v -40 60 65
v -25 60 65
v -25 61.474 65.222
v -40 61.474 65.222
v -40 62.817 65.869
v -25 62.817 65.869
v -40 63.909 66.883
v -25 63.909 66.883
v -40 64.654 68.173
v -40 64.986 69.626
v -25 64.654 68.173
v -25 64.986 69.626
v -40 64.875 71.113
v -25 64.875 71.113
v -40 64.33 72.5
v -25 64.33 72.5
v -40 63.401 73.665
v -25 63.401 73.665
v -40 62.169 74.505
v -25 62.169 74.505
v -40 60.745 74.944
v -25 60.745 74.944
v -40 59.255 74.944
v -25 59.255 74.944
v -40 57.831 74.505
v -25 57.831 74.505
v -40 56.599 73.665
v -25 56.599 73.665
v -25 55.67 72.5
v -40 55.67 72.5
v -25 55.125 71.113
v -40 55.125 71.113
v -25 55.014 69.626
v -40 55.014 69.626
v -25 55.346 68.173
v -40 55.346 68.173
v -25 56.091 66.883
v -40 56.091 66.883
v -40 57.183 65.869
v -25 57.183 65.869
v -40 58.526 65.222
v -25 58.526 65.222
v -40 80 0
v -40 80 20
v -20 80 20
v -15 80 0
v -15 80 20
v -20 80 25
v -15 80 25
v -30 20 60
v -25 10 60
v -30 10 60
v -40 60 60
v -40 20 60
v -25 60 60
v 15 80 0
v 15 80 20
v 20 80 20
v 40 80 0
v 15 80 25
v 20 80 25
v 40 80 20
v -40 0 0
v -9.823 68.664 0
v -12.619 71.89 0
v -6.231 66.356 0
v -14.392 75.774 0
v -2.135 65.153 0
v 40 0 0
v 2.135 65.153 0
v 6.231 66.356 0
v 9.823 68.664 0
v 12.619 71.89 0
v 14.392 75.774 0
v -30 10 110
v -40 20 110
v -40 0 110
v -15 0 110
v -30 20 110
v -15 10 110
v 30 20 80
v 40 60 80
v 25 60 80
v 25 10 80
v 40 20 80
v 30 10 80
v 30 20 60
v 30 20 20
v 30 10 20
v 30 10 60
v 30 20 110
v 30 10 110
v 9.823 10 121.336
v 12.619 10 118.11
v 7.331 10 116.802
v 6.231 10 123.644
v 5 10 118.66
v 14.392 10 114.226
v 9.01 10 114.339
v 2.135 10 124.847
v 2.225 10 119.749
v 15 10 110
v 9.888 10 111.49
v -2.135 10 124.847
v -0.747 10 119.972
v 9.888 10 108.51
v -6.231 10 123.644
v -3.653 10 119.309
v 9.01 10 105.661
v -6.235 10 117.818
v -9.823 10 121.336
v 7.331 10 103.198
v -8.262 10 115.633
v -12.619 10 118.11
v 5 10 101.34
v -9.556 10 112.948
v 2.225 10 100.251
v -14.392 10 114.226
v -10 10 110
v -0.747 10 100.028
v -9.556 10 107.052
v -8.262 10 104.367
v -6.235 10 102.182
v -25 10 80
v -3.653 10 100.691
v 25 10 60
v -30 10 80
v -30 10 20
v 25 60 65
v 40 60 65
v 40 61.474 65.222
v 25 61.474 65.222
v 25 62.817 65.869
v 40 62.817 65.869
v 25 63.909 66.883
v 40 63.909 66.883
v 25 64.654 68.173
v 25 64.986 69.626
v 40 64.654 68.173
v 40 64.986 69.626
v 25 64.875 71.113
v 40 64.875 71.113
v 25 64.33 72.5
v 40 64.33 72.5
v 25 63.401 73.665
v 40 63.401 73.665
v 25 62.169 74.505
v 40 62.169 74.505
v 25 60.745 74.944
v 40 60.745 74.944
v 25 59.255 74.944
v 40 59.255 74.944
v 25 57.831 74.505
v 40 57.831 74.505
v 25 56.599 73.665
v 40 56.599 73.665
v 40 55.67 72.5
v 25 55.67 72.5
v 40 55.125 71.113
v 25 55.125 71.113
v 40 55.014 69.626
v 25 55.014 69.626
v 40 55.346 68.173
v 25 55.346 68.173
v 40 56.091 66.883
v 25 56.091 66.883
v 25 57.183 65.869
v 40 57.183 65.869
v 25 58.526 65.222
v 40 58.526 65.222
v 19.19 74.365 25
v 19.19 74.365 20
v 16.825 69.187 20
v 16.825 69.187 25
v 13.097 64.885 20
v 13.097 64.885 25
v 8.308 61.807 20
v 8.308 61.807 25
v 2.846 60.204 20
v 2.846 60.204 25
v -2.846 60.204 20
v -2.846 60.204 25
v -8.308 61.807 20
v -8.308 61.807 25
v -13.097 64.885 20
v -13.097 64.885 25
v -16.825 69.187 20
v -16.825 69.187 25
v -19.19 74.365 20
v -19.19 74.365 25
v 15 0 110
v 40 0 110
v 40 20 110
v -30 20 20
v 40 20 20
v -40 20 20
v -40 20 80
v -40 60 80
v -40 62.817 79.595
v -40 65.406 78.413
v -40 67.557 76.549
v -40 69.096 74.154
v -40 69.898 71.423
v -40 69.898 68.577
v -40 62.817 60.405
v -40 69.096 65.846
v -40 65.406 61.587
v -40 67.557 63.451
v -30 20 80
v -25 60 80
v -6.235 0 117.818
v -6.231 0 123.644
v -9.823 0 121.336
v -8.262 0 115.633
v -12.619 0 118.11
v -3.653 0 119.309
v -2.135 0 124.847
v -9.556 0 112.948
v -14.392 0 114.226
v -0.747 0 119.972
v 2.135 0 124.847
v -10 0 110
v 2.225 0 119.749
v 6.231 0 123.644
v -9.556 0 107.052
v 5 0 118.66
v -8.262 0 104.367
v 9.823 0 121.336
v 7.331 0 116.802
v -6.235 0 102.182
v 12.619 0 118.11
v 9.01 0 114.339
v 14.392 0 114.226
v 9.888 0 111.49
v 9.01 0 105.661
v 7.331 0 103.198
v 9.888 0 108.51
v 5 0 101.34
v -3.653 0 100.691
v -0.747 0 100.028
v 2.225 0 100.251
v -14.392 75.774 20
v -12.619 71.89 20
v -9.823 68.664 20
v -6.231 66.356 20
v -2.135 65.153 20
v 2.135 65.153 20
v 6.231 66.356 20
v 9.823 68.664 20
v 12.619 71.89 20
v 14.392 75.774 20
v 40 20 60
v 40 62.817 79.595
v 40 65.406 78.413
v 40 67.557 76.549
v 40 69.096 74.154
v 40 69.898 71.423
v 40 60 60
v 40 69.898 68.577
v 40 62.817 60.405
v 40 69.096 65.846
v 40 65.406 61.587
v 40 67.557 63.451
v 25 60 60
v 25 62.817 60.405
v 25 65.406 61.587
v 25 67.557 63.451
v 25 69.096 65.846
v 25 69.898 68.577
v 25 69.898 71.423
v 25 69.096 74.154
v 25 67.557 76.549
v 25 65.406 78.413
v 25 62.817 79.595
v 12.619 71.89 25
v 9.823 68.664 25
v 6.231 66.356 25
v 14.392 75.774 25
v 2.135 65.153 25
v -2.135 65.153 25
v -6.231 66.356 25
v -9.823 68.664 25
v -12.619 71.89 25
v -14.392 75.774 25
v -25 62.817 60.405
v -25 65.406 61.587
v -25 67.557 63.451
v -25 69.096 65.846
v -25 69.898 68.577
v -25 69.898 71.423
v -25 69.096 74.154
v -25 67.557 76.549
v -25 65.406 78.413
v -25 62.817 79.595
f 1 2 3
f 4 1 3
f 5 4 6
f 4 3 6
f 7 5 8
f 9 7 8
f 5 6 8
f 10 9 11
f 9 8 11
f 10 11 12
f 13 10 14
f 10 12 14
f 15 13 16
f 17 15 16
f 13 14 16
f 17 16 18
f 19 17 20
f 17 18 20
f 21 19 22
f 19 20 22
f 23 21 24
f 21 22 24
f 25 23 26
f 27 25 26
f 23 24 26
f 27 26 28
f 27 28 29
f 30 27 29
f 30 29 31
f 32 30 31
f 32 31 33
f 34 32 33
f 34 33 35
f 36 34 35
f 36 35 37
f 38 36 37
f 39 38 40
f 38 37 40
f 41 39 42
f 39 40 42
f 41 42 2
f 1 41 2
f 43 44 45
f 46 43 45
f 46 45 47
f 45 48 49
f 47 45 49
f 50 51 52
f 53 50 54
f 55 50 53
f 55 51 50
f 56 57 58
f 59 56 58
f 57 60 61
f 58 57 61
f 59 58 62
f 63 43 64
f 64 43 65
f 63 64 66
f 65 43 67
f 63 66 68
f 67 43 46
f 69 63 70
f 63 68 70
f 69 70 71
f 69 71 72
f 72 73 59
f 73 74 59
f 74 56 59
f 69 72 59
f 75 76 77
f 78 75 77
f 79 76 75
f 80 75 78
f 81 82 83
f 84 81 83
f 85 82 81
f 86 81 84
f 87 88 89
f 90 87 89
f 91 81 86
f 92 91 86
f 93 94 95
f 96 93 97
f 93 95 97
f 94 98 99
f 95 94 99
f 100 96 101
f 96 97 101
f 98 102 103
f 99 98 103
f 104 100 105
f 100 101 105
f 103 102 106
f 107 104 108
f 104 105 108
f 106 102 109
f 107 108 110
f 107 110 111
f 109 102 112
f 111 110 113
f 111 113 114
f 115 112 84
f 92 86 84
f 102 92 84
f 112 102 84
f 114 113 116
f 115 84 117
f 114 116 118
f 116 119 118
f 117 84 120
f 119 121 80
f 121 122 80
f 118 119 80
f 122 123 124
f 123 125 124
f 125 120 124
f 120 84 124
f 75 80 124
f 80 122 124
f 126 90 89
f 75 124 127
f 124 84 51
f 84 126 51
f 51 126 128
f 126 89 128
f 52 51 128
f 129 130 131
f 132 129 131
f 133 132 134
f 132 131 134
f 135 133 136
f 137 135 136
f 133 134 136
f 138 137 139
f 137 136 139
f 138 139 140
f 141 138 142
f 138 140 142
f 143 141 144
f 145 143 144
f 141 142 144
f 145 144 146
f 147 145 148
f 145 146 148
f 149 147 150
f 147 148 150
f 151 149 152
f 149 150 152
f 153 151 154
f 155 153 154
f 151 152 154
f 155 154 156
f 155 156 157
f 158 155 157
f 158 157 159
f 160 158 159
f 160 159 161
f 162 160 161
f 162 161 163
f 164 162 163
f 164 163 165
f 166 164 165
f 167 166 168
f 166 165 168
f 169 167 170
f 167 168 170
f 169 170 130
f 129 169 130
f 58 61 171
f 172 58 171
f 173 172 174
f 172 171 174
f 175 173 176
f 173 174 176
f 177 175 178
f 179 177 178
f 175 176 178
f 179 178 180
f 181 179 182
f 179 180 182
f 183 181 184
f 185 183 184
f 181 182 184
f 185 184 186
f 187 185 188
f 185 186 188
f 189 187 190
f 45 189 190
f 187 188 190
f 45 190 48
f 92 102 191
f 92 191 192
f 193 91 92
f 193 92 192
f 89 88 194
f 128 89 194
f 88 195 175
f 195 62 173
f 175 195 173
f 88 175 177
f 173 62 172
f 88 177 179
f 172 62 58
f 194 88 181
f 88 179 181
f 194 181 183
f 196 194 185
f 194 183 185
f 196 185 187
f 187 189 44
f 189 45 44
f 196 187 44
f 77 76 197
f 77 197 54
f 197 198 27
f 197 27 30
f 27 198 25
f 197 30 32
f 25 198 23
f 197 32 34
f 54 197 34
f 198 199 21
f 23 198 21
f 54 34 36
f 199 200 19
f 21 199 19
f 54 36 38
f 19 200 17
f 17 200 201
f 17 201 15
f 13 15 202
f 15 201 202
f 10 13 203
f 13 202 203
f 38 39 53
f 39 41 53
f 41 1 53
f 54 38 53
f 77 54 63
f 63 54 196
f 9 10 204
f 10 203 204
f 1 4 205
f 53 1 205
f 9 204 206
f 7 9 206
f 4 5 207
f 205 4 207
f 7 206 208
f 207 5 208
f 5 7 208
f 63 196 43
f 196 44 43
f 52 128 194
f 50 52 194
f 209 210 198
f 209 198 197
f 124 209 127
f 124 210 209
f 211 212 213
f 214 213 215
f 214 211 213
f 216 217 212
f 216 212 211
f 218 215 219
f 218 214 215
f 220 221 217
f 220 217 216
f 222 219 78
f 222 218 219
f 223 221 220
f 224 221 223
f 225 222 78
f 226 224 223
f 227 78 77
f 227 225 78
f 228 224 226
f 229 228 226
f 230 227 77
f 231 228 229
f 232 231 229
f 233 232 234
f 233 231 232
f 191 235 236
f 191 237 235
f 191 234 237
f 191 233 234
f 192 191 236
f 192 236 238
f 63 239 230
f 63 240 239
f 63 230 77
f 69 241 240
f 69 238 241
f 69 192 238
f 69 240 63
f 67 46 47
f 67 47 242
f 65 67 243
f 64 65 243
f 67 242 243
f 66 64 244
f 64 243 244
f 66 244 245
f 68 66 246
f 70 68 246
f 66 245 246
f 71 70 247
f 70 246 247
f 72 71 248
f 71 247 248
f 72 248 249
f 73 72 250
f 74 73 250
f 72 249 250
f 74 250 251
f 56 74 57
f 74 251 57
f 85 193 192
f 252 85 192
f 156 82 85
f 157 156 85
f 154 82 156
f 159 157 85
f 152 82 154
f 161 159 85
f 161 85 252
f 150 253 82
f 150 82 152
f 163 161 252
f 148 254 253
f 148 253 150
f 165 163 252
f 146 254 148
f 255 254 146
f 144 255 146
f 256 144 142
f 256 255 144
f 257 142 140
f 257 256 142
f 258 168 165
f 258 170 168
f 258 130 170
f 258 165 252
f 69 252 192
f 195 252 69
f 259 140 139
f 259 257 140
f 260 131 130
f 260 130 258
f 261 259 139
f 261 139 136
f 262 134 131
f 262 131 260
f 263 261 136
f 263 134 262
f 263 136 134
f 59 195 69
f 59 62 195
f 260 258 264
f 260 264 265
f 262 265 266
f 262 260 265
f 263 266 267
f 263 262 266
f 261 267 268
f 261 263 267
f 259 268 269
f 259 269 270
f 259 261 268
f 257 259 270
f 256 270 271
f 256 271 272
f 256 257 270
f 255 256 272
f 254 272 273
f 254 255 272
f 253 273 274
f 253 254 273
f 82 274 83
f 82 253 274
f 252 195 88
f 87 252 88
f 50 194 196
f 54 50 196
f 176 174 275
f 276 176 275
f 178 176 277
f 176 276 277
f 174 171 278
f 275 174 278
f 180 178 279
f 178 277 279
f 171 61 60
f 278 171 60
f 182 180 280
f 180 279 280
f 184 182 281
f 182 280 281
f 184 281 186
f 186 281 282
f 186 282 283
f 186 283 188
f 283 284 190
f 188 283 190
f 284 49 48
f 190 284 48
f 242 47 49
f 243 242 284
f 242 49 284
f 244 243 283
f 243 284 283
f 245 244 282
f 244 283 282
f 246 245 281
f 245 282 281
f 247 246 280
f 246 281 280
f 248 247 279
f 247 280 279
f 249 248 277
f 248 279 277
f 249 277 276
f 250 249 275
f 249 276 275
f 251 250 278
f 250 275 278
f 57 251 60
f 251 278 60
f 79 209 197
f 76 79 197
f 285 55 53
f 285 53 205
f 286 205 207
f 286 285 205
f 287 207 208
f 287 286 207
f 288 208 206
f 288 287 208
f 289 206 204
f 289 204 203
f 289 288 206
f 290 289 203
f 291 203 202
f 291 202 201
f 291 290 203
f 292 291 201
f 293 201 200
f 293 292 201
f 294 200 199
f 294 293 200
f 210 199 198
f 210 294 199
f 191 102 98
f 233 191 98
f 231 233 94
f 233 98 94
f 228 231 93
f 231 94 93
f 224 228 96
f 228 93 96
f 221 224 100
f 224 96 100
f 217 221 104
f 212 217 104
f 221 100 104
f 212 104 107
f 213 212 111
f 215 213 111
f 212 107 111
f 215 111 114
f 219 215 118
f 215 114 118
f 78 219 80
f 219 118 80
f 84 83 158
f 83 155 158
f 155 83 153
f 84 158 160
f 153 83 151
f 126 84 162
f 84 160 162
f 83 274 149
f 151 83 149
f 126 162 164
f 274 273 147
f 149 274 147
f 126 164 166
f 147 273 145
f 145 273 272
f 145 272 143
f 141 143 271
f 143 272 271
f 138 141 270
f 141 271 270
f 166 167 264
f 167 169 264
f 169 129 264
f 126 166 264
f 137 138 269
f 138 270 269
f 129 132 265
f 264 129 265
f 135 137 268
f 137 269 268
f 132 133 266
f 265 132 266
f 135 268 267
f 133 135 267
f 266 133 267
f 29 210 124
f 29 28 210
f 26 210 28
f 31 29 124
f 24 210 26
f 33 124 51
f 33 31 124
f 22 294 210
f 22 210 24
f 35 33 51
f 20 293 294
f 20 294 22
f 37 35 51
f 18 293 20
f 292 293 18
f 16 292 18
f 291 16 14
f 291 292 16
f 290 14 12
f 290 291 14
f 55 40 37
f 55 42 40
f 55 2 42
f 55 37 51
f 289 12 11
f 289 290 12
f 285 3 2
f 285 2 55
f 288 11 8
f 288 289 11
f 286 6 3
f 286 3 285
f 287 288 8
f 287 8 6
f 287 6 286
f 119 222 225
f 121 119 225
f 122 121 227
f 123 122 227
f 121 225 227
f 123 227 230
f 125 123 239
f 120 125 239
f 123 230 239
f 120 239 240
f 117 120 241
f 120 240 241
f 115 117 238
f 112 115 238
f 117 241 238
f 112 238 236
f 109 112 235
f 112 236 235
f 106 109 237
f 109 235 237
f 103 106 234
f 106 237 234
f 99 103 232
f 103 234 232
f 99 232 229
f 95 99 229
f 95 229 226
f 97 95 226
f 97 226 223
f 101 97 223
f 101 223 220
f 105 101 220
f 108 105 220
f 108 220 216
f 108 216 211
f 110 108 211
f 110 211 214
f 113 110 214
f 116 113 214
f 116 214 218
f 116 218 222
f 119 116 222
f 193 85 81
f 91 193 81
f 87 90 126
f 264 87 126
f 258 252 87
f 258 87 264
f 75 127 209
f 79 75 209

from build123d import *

# Parameters (mm, degrees)
BOSS_EXTRUDE1_DEPTH = 110
SKETCH2_W           = 80
SKETCH2_H           = 80
BOSS_EXTRUDE2_DEPTH = 20
SKETCH3_R           = 15
CUT_EXTRUDE1_DEPTH  = 20
BOSS_EXTRUDE3_START = 5
BOSS_EXTRUDE3_DEPTH = 5
BOSS_EXTRUDE4_DEPTH = 10
HOLE1_D             = 20
SKETCH9_R           = 5
BOSS_EXTRUDE5_DEPTH = 15
LPATTERN1_COUNT     = 2
LPATTERN1_PITCH     = 65


with BuildPart() as part:
    # Sketch1 → Boss-Extrude1 (new body)
    with BuildSketch(Plane.XY):
        Polygon((-40, 20), (-40, 0), (40, 0), (40, 20), (30, 20), (30, 10), (-30, 10), (-30, 20), align=None)
    extrude(amount=BOSS_EXTRUDE1_DEPTH)

    # Sketch2 → Boss-Extrude2 (add)
    with BuildSketch(Plane(origin=(0, 0, 0), x_dir=(-1, 0, 0), z_dir=(0, 0, -1))):
        with Locations((0, 40)):
            Rectangle(SKETCH2_W, SKETCH2_H)
    extrude(amount=-BOSS_EXTRUDE2_DEPTH)

    # Sketch3 → Cut-Extrude1 (cut)
    with BuildSketch(Plane.XY.offset(20)):
        with Locations((0, 80)):
            Circle(SKETCH3_R)
    extrude(amount=-CUT_EXTRUDE1_DEPTH, mode=Mode.SUBTRACT)

    # Sketch4 → Boss-Extrude3 (add)
    with BuildSketch(Plane.XY.offset(20).offset(BOSS_EXTRUDE3_START)):
        with BuildLine():
            Line((-20, 80), (-15, 80))
            ThreePointArc((-15, 80), (0, 65), (15, 80))
            Line((15, 80), (20, 80))
            ThreePointArc((20, 80), (0, 60), (-20, 80))
        make_face()
    extrude(amount=-BOSS_EXTRUDE3_DEPTH)

    # Sketch6 → Boss-Extrude4 (add)
    with BuildSketch(Plane(origin=(0, 10, 0), x_dir=(1, 0, 0), z_dir=(0, 1, 0))):
        with BuildLine():
            Line((-15, -110), (15, -110))
            ThreePointArc((15, -110), (0, -125), (-15, -110))
        make_face()
    extrude(amount=-BOSS_EXTRUDE4_DEPTH)

    # Hole1 (through all)
    with Locations(Plane(origin=(0, 10, 0), x_dir=(1, 0, 0), z_dir=(0, 1, 0))):
        with Locations((0, -110)):
            Hole(HOLE1_D / 2)

    # Sketch9 → Boss-Extrude5 (add)
    with BuildSketch(Plane(origin=(40, 0, 0), x_dir=(0, 0, -1), z_dir=(1, 0, 0))):
        with BuildLine():
            Line((-80, 60), (-80, 0))
            Line((-80, 0), (-60, 0))
            Line((-60, 0), (-60, 60))
            ThreePointArc((-60, 60), (-70, 70), (-80, 60))
        make_face()
        with Locations((-70, 60)):
            Circle(SKETCH9_R, mode=Mode.SUBTRACT)
    boss_extrude5 = extrude(amount=-BOSS_EXTRUDE5_DEPTH)

    # LPattern1: Boss-Extrude5 ×2
    with Locations(*[(-i * LPATTERN1_PITCH, 0, 0) for i in range(1, LPATTERN1_COUNT)]):
        add(boss_extrude5)


solid = part.part
